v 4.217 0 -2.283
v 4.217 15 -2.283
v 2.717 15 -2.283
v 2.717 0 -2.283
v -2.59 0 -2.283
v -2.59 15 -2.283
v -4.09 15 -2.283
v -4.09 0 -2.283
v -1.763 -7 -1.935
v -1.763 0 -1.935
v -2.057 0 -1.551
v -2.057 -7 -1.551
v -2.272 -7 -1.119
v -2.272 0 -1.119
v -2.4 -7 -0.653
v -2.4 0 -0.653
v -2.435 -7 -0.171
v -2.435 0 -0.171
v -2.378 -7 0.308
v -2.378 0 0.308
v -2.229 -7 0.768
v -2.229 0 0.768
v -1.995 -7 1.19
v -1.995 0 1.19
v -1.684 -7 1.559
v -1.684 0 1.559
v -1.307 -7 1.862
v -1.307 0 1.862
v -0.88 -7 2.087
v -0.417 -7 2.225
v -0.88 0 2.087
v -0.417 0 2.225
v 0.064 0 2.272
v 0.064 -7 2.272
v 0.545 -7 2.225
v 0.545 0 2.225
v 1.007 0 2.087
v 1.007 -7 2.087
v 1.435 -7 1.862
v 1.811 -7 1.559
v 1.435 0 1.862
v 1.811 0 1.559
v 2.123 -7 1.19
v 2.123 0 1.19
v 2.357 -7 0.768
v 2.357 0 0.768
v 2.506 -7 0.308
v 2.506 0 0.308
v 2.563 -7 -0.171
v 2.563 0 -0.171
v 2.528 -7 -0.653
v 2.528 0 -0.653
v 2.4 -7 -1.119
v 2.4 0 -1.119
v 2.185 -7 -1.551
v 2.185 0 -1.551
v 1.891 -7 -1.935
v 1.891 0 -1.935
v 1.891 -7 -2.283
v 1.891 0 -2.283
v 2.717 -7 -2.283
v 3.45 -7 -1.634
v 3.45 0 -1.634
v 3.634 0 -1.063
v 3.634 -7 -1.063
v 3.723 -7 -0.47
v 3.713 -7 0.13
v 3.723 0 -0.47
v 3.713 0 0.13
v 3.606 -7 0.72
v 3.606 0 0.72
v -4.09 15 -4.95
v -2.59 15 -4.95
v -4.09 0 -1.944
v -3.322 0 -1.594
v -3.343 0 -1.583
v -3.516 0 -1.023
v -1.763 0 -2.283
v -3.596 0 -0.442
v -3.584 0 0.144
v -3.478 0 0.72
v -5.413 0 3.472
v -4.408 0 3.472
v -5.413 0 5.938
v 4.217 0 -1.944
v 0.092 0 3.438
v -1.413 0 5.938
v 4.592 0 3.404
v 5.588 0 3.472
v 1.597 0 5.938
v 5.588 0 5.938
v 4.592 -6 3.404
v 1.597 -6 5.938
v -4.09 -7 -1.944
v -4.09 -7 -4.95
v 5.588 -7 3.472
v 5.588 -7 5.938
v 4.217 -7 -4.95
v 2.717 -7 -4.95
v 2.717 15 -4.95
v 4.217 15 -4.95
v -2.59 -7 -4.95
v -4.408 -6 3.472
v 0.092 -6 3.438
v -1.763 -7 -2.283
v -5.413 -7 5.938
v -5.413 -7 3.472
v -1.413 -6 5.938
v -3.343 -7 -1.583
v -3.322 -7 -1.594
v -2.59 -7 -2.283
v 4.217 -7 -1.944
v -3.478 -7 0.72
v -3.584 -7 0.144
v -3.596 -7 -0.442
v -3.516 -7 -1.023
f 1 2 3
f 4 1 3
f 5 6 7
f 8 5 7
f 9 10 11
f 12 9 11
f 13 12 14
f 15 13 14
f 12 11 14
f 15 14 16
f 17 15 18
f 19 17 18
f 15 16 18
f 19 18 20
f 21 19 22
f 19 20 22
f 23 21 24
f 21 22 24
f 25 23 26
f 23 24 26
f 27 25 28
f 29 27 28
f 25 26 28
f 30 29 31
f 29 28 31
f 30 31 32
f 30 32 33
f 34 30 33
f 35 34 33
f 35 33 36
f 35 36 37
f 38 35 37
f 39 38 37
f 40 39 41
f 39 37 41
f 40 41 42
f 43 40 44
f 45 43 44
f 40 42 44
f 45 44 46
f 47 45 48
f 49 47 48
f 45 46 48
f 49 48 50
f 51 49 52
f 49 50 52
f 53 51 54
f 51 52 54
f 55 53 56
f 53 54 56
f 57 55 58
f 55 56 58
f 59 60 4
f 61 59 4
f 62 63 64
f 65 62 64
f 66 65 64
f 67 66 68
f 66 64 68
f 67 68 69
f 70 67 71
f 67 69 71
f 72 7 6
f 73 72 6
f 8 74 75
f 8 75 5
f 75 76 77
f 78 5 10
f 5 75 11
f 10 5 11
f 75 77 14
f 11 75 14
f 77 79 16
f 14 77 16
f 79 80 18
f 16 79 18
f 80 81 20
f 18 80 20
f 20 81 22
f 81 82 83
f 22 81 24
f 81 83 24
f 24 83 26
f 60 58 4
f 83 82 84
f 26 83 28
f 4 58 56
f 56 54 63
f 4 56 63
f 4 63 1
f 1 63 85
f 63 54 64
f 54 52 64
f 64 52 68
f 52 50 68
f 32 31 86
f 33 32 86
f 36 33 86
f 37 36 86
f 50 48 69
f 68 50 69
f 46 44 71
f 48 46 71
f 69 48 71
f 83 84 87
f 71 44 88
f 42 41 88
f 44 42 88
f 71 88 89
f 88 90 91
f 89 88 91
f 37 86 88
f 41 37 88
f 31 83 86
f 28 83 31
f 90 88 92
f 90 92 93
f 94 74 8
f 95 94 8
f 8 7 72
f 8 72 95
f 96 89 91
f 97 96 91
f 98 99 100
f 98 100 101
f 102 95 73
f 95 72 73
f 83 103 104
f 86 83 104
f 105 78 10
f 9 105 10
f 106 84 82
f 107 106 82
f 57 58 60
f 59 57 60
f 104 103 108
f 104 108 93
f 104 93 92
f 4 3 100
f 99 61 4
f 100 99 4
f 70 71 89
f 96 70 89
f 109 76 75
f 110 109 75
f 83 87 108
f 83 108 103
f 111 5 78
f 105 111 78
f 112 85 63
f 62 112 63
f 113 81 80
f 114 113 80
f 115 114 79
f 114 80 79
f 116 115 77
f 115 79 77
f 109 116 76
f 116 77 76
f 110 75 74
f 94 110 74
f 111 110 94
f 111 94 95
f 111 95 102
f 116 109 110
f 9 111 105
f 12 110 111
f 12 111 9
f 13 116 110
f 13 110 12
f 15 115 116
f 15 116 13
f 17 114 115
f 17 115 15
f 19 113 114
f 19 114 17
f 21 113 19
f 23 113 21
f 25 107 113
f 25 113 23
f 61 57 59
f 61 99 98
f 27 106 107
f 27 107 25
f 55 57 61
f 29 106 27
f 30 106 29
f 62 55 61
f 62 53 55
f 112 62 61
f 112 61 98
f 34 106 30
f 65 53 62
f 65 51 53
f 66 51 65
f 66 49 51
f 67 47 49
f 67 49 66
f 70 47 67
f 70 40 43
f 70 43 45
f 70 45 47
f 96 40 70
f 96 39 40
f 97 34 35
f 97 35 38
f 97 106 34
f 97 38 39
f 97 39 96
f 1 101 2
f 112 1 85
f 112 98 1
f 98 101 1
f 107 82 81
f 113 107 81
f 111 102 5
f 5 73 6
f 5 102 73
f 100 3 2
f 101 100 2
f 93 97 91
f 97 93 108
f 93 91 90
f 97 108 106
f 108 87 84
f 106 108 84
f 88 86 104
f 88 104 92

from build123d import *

# Parameters (mm, degrees)
F1_DEPTH = 7
F2_DEPTH = 6
F3_DEPTH = 15


with BuildPart() as f1:
    # F0 (on Front) → F1 (new body)
    with BuildSketch(Plane.XZ):
        with BuildLine():
            ThreePointArc((-3.477884, 0.719832), (-3.596369, -0.44229), (-3.343322, -1.5827))
            Line((-3.343322, -1.5827), (-3.322458, -1.593981))
            Line((-3.322458, -1.593981), (-3.322458, -2.283465))
            Line((-3.322458, -2.283465), (-2.589551, -2.283465))
            Line((-2.589551, -2.283465), (-1.76338, -2.283465))
            Line((-1.76338, -2.283465), (-1.76338, -1.934508))
            ThreePointArc((-1.76338, -1.934508), (0.063946, 2.271621), (1.891273, -1.934508))
            Line((1.891273, -1.934508), (1.891273, -2.283465))
            Line((1.891273, -2.283465), (2.717444, -2.283465))
            Line((2.717444, -2.283465), (3.450351, -2.283465))
            Line((3.450351, -2.283465), (3.450351, -1.634055))
            ThreePointArc((3.450351, -1.634055), (3.72254, -0.469953), (3.605777, 0.719832))
            ThreePointArc((3.605777, 0.719832), (2.307299, 2.6718), (0.091662, 3.438077))
            ThreePointArc((0.091662, 3.438077), (-2.157419, 2.688675), (-3.477884, 0.719832))
        make_face()
        Polygon((-3.322458, -2.283465), (-3.322458, -1.593981), (-4.089551, -1.943924), (-4.089551, -2.283465), align=None)
        with BuildLine():
            Line((-5.413338, 3.472093), (-3.477884, 0.719832))
            ThreePointArc((-3.477884, 0.719832), (-2.157419, 2.688675), (0.091662, 3.438077))
            Line((0.091662, 3.438077), (-4.408209, 3.472093))
            Line((-4.408209, 3.472093), (-1.413338, 5.938077))
            Line((-1.413338, 5.938077), (-5.413338, 5.938077))
            Line((-5.413338, 5.938077), (-5.413338, 3.472093))
        make_face()
        Polygon((-2.589551, -2.283465), (-3.322458, -2.283465), (-4.089551, -2.283465), (-4.089551, -4.949721), (-3.322458, -4.949721), (-2.589551, -4.949721), align=None)
        with BuildLine():
            Line((4.591534, 3.404061), (0.091662, 3.438077))
            ThreePointArc((0.091662, 3.438077), (2.307299, 2.6718), (3.605777, 0.719832))
            Line((3.605777, 0.719832), (5.587751, 3.472093))
            Line((5.587751, 3.472093), (5.587751, 5.938077))
            Line((5.587751, 5.938077), (1.596662, 5.938077))
            Line((1.596662, 5.938077), (4.591534, 3.404061))
        make_face()
        Polygon((-4.408209, 3.472093), (0.091662, 3.438077), (4.591534, 3.404061), (1.596662, 5.938077), (-1.413338, 5.938077), align=None)
        Polygon((4.217444, -1.943924), (3.450351, -1.634055), (3.450351, -2.283465), (4.217444, -2.283465), align=None)
        Polygon((4.217444, -2.283465), (3.450351, -2.283465), (2.717444, -2.283465), (2.717444, -4.949721), (3.450351, -4.949721), (4.217444, -4.949721), align=None)
    extrude(amount=F1_DEPTH)

    # F0 (on Front) → F2 (cut)
    with BuildSketch(Plane.XZ):
        Polygon((-4.408209, 3.472093), (0.091662, 3.438077), (4.591534, 3.404061), (1.596662, 5.938077), (-1.413338, 5.938077), align=None)
    extrude(amount=F2_DEPTH, mode=Mode.SUBTRACT)

    # F0 (on Front) → F3 (join)
    with BuildSketch(Plane.XZ):
        Polygon((4.217444, -2.283465), (3.450351, -2.283465), (2.717444, -2.283465), (2.717444, -4.949721), (3.450351, -4.949721), (4.217444, -4.949721), align=None)
        Polygon((-2.589551, -2.283465), (-3.322458, -2.283465), (-4.089551, -2.283465), (-4.089551, -4.949721), (-3.322458, -4.949721), (-2.589551, -4.949721), align=None)
    extrude(amount=-F3_DEPTH)


solid = f1.part
